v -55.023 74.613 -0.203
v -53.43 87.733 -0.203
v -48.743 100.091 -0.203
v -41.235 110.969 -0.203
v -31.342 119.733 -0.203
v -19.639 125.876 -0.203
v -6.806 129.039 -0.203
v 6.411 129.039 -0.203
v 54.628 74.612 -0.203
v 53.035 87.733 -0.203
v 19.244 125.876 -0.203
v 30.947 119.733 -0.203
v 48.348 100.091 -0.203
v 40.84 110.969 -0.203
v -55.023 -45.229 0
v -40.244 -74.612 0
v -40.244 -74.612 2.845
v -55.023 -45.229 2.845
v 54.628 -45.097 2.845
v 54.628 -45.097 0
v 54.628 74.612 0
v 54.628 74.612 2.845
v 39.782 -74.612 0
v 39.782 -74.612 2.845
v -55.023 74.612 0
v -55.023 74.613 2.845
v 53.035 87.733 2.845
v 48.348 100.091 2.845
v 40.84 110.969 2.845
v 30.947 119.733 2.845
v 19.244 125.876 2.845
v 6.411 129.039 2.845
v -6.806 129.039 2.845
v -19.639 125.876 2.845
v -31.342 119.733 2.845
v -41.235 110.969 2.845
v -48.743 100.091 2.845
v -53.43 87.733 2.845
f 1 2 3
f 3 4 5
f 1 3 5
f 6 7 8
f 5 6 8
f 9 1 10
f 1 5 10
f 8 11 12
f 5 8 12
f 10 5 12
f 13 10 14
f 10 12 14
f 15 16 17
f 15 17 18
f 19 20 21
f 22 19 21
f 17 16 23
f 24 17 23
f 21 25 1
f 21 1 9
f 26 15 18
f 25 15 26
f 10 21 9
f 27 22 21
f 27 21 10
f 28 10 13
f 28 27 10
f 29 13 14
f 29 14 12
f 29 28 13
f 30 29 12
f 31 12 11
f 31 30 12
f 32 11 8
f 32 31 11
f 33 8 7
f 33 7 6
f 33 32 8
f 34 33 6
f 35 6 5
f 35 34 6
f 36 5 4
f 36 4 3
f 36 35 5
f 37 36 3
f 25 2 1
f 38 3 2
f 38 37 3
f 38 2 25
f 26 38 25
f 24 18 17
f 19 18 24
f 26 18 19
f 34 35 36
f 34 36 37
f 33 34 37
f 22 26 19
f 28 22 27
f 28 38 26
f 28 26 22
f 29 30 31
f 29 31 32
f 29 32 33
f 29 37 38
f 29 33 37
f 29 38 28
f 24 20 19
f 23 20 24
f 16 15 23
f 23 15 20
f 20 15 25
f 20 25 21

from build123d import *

# Parameters (mm, degrees)
F0_W     = 109.6518
F0_H     = 149.225
F1_DEPTH = 2.8448
F3_DEPTH = 25.4
F5_DEPTH = 3.048
F9_DEPTH = 107.442


# Not quite as in the source:
# - a feature names something its author has since deleted; it is built from what else it names


with BuildPart() as f1:
    # F0 (on Top) → F1 (new body)
    with BuildSketch(Plane.XY):
        with Locations((13.2645608256, 0)):
            Rectangle(F0_W, F0_H)
    extrude(amount=F1_DEPTH)

    # F2 (on face) → F3 (cut)
    with BuildSketch(Plane.XY.offset(2.8448)):
        Polygon((68.0904608256, -74.6125), (27.7860667557, -74.6125), (68.0904608256, -75.2405971289), align=None)
        Polygon((-41.5613391744, -75.712069869), (-25.0190570951, -74.6125), (-41.5613391744, -74.6125), align=None)
    extrude(amount=-F3_DEPTH, mode=Mode.SUBTRACT)

    # F4 (on face) → F5 (join)
    with BuildSketch(Plane.XY.offset(2.8448)):
        with BuildLine():
            Line((-41.5613391744, 74.6125), (68.0904608256, 74.6125))
            ThreePointArc((68.0904608256, 74.6125), (13.2645608256, 129.4384), (-41.5613391744, 74.6125))
        make_face()
    extrude(amount=-F5_DEPTH)


with BuildPart() as f1_1:
    # F6: moved
    add(f1.part.moved(Location((-10.668, 0, 0))))


with BuildPart() as f1_2:
    # F7: moved
    add(f1_1.part.moved(Location((-2.794, 0, 0))))

    # F8 (on Top) → F9 (cut)
    with BuildSketch(Plane.XY):
        Polygon((-55.1044642925, -45.067888195), (-55.1044642925, -74.785888195), (-40.1565642925, -74.785888195), align=None)
        Polygon((54.6766667015, -45.0012958965), (39.7287667015, -74.7192958965), (54.6766667015, -74.7192958965), align=None)
    extrude(amount=F9_DEPTH, mode=Mode.SUBTRACT)


solid = f1_2.part
